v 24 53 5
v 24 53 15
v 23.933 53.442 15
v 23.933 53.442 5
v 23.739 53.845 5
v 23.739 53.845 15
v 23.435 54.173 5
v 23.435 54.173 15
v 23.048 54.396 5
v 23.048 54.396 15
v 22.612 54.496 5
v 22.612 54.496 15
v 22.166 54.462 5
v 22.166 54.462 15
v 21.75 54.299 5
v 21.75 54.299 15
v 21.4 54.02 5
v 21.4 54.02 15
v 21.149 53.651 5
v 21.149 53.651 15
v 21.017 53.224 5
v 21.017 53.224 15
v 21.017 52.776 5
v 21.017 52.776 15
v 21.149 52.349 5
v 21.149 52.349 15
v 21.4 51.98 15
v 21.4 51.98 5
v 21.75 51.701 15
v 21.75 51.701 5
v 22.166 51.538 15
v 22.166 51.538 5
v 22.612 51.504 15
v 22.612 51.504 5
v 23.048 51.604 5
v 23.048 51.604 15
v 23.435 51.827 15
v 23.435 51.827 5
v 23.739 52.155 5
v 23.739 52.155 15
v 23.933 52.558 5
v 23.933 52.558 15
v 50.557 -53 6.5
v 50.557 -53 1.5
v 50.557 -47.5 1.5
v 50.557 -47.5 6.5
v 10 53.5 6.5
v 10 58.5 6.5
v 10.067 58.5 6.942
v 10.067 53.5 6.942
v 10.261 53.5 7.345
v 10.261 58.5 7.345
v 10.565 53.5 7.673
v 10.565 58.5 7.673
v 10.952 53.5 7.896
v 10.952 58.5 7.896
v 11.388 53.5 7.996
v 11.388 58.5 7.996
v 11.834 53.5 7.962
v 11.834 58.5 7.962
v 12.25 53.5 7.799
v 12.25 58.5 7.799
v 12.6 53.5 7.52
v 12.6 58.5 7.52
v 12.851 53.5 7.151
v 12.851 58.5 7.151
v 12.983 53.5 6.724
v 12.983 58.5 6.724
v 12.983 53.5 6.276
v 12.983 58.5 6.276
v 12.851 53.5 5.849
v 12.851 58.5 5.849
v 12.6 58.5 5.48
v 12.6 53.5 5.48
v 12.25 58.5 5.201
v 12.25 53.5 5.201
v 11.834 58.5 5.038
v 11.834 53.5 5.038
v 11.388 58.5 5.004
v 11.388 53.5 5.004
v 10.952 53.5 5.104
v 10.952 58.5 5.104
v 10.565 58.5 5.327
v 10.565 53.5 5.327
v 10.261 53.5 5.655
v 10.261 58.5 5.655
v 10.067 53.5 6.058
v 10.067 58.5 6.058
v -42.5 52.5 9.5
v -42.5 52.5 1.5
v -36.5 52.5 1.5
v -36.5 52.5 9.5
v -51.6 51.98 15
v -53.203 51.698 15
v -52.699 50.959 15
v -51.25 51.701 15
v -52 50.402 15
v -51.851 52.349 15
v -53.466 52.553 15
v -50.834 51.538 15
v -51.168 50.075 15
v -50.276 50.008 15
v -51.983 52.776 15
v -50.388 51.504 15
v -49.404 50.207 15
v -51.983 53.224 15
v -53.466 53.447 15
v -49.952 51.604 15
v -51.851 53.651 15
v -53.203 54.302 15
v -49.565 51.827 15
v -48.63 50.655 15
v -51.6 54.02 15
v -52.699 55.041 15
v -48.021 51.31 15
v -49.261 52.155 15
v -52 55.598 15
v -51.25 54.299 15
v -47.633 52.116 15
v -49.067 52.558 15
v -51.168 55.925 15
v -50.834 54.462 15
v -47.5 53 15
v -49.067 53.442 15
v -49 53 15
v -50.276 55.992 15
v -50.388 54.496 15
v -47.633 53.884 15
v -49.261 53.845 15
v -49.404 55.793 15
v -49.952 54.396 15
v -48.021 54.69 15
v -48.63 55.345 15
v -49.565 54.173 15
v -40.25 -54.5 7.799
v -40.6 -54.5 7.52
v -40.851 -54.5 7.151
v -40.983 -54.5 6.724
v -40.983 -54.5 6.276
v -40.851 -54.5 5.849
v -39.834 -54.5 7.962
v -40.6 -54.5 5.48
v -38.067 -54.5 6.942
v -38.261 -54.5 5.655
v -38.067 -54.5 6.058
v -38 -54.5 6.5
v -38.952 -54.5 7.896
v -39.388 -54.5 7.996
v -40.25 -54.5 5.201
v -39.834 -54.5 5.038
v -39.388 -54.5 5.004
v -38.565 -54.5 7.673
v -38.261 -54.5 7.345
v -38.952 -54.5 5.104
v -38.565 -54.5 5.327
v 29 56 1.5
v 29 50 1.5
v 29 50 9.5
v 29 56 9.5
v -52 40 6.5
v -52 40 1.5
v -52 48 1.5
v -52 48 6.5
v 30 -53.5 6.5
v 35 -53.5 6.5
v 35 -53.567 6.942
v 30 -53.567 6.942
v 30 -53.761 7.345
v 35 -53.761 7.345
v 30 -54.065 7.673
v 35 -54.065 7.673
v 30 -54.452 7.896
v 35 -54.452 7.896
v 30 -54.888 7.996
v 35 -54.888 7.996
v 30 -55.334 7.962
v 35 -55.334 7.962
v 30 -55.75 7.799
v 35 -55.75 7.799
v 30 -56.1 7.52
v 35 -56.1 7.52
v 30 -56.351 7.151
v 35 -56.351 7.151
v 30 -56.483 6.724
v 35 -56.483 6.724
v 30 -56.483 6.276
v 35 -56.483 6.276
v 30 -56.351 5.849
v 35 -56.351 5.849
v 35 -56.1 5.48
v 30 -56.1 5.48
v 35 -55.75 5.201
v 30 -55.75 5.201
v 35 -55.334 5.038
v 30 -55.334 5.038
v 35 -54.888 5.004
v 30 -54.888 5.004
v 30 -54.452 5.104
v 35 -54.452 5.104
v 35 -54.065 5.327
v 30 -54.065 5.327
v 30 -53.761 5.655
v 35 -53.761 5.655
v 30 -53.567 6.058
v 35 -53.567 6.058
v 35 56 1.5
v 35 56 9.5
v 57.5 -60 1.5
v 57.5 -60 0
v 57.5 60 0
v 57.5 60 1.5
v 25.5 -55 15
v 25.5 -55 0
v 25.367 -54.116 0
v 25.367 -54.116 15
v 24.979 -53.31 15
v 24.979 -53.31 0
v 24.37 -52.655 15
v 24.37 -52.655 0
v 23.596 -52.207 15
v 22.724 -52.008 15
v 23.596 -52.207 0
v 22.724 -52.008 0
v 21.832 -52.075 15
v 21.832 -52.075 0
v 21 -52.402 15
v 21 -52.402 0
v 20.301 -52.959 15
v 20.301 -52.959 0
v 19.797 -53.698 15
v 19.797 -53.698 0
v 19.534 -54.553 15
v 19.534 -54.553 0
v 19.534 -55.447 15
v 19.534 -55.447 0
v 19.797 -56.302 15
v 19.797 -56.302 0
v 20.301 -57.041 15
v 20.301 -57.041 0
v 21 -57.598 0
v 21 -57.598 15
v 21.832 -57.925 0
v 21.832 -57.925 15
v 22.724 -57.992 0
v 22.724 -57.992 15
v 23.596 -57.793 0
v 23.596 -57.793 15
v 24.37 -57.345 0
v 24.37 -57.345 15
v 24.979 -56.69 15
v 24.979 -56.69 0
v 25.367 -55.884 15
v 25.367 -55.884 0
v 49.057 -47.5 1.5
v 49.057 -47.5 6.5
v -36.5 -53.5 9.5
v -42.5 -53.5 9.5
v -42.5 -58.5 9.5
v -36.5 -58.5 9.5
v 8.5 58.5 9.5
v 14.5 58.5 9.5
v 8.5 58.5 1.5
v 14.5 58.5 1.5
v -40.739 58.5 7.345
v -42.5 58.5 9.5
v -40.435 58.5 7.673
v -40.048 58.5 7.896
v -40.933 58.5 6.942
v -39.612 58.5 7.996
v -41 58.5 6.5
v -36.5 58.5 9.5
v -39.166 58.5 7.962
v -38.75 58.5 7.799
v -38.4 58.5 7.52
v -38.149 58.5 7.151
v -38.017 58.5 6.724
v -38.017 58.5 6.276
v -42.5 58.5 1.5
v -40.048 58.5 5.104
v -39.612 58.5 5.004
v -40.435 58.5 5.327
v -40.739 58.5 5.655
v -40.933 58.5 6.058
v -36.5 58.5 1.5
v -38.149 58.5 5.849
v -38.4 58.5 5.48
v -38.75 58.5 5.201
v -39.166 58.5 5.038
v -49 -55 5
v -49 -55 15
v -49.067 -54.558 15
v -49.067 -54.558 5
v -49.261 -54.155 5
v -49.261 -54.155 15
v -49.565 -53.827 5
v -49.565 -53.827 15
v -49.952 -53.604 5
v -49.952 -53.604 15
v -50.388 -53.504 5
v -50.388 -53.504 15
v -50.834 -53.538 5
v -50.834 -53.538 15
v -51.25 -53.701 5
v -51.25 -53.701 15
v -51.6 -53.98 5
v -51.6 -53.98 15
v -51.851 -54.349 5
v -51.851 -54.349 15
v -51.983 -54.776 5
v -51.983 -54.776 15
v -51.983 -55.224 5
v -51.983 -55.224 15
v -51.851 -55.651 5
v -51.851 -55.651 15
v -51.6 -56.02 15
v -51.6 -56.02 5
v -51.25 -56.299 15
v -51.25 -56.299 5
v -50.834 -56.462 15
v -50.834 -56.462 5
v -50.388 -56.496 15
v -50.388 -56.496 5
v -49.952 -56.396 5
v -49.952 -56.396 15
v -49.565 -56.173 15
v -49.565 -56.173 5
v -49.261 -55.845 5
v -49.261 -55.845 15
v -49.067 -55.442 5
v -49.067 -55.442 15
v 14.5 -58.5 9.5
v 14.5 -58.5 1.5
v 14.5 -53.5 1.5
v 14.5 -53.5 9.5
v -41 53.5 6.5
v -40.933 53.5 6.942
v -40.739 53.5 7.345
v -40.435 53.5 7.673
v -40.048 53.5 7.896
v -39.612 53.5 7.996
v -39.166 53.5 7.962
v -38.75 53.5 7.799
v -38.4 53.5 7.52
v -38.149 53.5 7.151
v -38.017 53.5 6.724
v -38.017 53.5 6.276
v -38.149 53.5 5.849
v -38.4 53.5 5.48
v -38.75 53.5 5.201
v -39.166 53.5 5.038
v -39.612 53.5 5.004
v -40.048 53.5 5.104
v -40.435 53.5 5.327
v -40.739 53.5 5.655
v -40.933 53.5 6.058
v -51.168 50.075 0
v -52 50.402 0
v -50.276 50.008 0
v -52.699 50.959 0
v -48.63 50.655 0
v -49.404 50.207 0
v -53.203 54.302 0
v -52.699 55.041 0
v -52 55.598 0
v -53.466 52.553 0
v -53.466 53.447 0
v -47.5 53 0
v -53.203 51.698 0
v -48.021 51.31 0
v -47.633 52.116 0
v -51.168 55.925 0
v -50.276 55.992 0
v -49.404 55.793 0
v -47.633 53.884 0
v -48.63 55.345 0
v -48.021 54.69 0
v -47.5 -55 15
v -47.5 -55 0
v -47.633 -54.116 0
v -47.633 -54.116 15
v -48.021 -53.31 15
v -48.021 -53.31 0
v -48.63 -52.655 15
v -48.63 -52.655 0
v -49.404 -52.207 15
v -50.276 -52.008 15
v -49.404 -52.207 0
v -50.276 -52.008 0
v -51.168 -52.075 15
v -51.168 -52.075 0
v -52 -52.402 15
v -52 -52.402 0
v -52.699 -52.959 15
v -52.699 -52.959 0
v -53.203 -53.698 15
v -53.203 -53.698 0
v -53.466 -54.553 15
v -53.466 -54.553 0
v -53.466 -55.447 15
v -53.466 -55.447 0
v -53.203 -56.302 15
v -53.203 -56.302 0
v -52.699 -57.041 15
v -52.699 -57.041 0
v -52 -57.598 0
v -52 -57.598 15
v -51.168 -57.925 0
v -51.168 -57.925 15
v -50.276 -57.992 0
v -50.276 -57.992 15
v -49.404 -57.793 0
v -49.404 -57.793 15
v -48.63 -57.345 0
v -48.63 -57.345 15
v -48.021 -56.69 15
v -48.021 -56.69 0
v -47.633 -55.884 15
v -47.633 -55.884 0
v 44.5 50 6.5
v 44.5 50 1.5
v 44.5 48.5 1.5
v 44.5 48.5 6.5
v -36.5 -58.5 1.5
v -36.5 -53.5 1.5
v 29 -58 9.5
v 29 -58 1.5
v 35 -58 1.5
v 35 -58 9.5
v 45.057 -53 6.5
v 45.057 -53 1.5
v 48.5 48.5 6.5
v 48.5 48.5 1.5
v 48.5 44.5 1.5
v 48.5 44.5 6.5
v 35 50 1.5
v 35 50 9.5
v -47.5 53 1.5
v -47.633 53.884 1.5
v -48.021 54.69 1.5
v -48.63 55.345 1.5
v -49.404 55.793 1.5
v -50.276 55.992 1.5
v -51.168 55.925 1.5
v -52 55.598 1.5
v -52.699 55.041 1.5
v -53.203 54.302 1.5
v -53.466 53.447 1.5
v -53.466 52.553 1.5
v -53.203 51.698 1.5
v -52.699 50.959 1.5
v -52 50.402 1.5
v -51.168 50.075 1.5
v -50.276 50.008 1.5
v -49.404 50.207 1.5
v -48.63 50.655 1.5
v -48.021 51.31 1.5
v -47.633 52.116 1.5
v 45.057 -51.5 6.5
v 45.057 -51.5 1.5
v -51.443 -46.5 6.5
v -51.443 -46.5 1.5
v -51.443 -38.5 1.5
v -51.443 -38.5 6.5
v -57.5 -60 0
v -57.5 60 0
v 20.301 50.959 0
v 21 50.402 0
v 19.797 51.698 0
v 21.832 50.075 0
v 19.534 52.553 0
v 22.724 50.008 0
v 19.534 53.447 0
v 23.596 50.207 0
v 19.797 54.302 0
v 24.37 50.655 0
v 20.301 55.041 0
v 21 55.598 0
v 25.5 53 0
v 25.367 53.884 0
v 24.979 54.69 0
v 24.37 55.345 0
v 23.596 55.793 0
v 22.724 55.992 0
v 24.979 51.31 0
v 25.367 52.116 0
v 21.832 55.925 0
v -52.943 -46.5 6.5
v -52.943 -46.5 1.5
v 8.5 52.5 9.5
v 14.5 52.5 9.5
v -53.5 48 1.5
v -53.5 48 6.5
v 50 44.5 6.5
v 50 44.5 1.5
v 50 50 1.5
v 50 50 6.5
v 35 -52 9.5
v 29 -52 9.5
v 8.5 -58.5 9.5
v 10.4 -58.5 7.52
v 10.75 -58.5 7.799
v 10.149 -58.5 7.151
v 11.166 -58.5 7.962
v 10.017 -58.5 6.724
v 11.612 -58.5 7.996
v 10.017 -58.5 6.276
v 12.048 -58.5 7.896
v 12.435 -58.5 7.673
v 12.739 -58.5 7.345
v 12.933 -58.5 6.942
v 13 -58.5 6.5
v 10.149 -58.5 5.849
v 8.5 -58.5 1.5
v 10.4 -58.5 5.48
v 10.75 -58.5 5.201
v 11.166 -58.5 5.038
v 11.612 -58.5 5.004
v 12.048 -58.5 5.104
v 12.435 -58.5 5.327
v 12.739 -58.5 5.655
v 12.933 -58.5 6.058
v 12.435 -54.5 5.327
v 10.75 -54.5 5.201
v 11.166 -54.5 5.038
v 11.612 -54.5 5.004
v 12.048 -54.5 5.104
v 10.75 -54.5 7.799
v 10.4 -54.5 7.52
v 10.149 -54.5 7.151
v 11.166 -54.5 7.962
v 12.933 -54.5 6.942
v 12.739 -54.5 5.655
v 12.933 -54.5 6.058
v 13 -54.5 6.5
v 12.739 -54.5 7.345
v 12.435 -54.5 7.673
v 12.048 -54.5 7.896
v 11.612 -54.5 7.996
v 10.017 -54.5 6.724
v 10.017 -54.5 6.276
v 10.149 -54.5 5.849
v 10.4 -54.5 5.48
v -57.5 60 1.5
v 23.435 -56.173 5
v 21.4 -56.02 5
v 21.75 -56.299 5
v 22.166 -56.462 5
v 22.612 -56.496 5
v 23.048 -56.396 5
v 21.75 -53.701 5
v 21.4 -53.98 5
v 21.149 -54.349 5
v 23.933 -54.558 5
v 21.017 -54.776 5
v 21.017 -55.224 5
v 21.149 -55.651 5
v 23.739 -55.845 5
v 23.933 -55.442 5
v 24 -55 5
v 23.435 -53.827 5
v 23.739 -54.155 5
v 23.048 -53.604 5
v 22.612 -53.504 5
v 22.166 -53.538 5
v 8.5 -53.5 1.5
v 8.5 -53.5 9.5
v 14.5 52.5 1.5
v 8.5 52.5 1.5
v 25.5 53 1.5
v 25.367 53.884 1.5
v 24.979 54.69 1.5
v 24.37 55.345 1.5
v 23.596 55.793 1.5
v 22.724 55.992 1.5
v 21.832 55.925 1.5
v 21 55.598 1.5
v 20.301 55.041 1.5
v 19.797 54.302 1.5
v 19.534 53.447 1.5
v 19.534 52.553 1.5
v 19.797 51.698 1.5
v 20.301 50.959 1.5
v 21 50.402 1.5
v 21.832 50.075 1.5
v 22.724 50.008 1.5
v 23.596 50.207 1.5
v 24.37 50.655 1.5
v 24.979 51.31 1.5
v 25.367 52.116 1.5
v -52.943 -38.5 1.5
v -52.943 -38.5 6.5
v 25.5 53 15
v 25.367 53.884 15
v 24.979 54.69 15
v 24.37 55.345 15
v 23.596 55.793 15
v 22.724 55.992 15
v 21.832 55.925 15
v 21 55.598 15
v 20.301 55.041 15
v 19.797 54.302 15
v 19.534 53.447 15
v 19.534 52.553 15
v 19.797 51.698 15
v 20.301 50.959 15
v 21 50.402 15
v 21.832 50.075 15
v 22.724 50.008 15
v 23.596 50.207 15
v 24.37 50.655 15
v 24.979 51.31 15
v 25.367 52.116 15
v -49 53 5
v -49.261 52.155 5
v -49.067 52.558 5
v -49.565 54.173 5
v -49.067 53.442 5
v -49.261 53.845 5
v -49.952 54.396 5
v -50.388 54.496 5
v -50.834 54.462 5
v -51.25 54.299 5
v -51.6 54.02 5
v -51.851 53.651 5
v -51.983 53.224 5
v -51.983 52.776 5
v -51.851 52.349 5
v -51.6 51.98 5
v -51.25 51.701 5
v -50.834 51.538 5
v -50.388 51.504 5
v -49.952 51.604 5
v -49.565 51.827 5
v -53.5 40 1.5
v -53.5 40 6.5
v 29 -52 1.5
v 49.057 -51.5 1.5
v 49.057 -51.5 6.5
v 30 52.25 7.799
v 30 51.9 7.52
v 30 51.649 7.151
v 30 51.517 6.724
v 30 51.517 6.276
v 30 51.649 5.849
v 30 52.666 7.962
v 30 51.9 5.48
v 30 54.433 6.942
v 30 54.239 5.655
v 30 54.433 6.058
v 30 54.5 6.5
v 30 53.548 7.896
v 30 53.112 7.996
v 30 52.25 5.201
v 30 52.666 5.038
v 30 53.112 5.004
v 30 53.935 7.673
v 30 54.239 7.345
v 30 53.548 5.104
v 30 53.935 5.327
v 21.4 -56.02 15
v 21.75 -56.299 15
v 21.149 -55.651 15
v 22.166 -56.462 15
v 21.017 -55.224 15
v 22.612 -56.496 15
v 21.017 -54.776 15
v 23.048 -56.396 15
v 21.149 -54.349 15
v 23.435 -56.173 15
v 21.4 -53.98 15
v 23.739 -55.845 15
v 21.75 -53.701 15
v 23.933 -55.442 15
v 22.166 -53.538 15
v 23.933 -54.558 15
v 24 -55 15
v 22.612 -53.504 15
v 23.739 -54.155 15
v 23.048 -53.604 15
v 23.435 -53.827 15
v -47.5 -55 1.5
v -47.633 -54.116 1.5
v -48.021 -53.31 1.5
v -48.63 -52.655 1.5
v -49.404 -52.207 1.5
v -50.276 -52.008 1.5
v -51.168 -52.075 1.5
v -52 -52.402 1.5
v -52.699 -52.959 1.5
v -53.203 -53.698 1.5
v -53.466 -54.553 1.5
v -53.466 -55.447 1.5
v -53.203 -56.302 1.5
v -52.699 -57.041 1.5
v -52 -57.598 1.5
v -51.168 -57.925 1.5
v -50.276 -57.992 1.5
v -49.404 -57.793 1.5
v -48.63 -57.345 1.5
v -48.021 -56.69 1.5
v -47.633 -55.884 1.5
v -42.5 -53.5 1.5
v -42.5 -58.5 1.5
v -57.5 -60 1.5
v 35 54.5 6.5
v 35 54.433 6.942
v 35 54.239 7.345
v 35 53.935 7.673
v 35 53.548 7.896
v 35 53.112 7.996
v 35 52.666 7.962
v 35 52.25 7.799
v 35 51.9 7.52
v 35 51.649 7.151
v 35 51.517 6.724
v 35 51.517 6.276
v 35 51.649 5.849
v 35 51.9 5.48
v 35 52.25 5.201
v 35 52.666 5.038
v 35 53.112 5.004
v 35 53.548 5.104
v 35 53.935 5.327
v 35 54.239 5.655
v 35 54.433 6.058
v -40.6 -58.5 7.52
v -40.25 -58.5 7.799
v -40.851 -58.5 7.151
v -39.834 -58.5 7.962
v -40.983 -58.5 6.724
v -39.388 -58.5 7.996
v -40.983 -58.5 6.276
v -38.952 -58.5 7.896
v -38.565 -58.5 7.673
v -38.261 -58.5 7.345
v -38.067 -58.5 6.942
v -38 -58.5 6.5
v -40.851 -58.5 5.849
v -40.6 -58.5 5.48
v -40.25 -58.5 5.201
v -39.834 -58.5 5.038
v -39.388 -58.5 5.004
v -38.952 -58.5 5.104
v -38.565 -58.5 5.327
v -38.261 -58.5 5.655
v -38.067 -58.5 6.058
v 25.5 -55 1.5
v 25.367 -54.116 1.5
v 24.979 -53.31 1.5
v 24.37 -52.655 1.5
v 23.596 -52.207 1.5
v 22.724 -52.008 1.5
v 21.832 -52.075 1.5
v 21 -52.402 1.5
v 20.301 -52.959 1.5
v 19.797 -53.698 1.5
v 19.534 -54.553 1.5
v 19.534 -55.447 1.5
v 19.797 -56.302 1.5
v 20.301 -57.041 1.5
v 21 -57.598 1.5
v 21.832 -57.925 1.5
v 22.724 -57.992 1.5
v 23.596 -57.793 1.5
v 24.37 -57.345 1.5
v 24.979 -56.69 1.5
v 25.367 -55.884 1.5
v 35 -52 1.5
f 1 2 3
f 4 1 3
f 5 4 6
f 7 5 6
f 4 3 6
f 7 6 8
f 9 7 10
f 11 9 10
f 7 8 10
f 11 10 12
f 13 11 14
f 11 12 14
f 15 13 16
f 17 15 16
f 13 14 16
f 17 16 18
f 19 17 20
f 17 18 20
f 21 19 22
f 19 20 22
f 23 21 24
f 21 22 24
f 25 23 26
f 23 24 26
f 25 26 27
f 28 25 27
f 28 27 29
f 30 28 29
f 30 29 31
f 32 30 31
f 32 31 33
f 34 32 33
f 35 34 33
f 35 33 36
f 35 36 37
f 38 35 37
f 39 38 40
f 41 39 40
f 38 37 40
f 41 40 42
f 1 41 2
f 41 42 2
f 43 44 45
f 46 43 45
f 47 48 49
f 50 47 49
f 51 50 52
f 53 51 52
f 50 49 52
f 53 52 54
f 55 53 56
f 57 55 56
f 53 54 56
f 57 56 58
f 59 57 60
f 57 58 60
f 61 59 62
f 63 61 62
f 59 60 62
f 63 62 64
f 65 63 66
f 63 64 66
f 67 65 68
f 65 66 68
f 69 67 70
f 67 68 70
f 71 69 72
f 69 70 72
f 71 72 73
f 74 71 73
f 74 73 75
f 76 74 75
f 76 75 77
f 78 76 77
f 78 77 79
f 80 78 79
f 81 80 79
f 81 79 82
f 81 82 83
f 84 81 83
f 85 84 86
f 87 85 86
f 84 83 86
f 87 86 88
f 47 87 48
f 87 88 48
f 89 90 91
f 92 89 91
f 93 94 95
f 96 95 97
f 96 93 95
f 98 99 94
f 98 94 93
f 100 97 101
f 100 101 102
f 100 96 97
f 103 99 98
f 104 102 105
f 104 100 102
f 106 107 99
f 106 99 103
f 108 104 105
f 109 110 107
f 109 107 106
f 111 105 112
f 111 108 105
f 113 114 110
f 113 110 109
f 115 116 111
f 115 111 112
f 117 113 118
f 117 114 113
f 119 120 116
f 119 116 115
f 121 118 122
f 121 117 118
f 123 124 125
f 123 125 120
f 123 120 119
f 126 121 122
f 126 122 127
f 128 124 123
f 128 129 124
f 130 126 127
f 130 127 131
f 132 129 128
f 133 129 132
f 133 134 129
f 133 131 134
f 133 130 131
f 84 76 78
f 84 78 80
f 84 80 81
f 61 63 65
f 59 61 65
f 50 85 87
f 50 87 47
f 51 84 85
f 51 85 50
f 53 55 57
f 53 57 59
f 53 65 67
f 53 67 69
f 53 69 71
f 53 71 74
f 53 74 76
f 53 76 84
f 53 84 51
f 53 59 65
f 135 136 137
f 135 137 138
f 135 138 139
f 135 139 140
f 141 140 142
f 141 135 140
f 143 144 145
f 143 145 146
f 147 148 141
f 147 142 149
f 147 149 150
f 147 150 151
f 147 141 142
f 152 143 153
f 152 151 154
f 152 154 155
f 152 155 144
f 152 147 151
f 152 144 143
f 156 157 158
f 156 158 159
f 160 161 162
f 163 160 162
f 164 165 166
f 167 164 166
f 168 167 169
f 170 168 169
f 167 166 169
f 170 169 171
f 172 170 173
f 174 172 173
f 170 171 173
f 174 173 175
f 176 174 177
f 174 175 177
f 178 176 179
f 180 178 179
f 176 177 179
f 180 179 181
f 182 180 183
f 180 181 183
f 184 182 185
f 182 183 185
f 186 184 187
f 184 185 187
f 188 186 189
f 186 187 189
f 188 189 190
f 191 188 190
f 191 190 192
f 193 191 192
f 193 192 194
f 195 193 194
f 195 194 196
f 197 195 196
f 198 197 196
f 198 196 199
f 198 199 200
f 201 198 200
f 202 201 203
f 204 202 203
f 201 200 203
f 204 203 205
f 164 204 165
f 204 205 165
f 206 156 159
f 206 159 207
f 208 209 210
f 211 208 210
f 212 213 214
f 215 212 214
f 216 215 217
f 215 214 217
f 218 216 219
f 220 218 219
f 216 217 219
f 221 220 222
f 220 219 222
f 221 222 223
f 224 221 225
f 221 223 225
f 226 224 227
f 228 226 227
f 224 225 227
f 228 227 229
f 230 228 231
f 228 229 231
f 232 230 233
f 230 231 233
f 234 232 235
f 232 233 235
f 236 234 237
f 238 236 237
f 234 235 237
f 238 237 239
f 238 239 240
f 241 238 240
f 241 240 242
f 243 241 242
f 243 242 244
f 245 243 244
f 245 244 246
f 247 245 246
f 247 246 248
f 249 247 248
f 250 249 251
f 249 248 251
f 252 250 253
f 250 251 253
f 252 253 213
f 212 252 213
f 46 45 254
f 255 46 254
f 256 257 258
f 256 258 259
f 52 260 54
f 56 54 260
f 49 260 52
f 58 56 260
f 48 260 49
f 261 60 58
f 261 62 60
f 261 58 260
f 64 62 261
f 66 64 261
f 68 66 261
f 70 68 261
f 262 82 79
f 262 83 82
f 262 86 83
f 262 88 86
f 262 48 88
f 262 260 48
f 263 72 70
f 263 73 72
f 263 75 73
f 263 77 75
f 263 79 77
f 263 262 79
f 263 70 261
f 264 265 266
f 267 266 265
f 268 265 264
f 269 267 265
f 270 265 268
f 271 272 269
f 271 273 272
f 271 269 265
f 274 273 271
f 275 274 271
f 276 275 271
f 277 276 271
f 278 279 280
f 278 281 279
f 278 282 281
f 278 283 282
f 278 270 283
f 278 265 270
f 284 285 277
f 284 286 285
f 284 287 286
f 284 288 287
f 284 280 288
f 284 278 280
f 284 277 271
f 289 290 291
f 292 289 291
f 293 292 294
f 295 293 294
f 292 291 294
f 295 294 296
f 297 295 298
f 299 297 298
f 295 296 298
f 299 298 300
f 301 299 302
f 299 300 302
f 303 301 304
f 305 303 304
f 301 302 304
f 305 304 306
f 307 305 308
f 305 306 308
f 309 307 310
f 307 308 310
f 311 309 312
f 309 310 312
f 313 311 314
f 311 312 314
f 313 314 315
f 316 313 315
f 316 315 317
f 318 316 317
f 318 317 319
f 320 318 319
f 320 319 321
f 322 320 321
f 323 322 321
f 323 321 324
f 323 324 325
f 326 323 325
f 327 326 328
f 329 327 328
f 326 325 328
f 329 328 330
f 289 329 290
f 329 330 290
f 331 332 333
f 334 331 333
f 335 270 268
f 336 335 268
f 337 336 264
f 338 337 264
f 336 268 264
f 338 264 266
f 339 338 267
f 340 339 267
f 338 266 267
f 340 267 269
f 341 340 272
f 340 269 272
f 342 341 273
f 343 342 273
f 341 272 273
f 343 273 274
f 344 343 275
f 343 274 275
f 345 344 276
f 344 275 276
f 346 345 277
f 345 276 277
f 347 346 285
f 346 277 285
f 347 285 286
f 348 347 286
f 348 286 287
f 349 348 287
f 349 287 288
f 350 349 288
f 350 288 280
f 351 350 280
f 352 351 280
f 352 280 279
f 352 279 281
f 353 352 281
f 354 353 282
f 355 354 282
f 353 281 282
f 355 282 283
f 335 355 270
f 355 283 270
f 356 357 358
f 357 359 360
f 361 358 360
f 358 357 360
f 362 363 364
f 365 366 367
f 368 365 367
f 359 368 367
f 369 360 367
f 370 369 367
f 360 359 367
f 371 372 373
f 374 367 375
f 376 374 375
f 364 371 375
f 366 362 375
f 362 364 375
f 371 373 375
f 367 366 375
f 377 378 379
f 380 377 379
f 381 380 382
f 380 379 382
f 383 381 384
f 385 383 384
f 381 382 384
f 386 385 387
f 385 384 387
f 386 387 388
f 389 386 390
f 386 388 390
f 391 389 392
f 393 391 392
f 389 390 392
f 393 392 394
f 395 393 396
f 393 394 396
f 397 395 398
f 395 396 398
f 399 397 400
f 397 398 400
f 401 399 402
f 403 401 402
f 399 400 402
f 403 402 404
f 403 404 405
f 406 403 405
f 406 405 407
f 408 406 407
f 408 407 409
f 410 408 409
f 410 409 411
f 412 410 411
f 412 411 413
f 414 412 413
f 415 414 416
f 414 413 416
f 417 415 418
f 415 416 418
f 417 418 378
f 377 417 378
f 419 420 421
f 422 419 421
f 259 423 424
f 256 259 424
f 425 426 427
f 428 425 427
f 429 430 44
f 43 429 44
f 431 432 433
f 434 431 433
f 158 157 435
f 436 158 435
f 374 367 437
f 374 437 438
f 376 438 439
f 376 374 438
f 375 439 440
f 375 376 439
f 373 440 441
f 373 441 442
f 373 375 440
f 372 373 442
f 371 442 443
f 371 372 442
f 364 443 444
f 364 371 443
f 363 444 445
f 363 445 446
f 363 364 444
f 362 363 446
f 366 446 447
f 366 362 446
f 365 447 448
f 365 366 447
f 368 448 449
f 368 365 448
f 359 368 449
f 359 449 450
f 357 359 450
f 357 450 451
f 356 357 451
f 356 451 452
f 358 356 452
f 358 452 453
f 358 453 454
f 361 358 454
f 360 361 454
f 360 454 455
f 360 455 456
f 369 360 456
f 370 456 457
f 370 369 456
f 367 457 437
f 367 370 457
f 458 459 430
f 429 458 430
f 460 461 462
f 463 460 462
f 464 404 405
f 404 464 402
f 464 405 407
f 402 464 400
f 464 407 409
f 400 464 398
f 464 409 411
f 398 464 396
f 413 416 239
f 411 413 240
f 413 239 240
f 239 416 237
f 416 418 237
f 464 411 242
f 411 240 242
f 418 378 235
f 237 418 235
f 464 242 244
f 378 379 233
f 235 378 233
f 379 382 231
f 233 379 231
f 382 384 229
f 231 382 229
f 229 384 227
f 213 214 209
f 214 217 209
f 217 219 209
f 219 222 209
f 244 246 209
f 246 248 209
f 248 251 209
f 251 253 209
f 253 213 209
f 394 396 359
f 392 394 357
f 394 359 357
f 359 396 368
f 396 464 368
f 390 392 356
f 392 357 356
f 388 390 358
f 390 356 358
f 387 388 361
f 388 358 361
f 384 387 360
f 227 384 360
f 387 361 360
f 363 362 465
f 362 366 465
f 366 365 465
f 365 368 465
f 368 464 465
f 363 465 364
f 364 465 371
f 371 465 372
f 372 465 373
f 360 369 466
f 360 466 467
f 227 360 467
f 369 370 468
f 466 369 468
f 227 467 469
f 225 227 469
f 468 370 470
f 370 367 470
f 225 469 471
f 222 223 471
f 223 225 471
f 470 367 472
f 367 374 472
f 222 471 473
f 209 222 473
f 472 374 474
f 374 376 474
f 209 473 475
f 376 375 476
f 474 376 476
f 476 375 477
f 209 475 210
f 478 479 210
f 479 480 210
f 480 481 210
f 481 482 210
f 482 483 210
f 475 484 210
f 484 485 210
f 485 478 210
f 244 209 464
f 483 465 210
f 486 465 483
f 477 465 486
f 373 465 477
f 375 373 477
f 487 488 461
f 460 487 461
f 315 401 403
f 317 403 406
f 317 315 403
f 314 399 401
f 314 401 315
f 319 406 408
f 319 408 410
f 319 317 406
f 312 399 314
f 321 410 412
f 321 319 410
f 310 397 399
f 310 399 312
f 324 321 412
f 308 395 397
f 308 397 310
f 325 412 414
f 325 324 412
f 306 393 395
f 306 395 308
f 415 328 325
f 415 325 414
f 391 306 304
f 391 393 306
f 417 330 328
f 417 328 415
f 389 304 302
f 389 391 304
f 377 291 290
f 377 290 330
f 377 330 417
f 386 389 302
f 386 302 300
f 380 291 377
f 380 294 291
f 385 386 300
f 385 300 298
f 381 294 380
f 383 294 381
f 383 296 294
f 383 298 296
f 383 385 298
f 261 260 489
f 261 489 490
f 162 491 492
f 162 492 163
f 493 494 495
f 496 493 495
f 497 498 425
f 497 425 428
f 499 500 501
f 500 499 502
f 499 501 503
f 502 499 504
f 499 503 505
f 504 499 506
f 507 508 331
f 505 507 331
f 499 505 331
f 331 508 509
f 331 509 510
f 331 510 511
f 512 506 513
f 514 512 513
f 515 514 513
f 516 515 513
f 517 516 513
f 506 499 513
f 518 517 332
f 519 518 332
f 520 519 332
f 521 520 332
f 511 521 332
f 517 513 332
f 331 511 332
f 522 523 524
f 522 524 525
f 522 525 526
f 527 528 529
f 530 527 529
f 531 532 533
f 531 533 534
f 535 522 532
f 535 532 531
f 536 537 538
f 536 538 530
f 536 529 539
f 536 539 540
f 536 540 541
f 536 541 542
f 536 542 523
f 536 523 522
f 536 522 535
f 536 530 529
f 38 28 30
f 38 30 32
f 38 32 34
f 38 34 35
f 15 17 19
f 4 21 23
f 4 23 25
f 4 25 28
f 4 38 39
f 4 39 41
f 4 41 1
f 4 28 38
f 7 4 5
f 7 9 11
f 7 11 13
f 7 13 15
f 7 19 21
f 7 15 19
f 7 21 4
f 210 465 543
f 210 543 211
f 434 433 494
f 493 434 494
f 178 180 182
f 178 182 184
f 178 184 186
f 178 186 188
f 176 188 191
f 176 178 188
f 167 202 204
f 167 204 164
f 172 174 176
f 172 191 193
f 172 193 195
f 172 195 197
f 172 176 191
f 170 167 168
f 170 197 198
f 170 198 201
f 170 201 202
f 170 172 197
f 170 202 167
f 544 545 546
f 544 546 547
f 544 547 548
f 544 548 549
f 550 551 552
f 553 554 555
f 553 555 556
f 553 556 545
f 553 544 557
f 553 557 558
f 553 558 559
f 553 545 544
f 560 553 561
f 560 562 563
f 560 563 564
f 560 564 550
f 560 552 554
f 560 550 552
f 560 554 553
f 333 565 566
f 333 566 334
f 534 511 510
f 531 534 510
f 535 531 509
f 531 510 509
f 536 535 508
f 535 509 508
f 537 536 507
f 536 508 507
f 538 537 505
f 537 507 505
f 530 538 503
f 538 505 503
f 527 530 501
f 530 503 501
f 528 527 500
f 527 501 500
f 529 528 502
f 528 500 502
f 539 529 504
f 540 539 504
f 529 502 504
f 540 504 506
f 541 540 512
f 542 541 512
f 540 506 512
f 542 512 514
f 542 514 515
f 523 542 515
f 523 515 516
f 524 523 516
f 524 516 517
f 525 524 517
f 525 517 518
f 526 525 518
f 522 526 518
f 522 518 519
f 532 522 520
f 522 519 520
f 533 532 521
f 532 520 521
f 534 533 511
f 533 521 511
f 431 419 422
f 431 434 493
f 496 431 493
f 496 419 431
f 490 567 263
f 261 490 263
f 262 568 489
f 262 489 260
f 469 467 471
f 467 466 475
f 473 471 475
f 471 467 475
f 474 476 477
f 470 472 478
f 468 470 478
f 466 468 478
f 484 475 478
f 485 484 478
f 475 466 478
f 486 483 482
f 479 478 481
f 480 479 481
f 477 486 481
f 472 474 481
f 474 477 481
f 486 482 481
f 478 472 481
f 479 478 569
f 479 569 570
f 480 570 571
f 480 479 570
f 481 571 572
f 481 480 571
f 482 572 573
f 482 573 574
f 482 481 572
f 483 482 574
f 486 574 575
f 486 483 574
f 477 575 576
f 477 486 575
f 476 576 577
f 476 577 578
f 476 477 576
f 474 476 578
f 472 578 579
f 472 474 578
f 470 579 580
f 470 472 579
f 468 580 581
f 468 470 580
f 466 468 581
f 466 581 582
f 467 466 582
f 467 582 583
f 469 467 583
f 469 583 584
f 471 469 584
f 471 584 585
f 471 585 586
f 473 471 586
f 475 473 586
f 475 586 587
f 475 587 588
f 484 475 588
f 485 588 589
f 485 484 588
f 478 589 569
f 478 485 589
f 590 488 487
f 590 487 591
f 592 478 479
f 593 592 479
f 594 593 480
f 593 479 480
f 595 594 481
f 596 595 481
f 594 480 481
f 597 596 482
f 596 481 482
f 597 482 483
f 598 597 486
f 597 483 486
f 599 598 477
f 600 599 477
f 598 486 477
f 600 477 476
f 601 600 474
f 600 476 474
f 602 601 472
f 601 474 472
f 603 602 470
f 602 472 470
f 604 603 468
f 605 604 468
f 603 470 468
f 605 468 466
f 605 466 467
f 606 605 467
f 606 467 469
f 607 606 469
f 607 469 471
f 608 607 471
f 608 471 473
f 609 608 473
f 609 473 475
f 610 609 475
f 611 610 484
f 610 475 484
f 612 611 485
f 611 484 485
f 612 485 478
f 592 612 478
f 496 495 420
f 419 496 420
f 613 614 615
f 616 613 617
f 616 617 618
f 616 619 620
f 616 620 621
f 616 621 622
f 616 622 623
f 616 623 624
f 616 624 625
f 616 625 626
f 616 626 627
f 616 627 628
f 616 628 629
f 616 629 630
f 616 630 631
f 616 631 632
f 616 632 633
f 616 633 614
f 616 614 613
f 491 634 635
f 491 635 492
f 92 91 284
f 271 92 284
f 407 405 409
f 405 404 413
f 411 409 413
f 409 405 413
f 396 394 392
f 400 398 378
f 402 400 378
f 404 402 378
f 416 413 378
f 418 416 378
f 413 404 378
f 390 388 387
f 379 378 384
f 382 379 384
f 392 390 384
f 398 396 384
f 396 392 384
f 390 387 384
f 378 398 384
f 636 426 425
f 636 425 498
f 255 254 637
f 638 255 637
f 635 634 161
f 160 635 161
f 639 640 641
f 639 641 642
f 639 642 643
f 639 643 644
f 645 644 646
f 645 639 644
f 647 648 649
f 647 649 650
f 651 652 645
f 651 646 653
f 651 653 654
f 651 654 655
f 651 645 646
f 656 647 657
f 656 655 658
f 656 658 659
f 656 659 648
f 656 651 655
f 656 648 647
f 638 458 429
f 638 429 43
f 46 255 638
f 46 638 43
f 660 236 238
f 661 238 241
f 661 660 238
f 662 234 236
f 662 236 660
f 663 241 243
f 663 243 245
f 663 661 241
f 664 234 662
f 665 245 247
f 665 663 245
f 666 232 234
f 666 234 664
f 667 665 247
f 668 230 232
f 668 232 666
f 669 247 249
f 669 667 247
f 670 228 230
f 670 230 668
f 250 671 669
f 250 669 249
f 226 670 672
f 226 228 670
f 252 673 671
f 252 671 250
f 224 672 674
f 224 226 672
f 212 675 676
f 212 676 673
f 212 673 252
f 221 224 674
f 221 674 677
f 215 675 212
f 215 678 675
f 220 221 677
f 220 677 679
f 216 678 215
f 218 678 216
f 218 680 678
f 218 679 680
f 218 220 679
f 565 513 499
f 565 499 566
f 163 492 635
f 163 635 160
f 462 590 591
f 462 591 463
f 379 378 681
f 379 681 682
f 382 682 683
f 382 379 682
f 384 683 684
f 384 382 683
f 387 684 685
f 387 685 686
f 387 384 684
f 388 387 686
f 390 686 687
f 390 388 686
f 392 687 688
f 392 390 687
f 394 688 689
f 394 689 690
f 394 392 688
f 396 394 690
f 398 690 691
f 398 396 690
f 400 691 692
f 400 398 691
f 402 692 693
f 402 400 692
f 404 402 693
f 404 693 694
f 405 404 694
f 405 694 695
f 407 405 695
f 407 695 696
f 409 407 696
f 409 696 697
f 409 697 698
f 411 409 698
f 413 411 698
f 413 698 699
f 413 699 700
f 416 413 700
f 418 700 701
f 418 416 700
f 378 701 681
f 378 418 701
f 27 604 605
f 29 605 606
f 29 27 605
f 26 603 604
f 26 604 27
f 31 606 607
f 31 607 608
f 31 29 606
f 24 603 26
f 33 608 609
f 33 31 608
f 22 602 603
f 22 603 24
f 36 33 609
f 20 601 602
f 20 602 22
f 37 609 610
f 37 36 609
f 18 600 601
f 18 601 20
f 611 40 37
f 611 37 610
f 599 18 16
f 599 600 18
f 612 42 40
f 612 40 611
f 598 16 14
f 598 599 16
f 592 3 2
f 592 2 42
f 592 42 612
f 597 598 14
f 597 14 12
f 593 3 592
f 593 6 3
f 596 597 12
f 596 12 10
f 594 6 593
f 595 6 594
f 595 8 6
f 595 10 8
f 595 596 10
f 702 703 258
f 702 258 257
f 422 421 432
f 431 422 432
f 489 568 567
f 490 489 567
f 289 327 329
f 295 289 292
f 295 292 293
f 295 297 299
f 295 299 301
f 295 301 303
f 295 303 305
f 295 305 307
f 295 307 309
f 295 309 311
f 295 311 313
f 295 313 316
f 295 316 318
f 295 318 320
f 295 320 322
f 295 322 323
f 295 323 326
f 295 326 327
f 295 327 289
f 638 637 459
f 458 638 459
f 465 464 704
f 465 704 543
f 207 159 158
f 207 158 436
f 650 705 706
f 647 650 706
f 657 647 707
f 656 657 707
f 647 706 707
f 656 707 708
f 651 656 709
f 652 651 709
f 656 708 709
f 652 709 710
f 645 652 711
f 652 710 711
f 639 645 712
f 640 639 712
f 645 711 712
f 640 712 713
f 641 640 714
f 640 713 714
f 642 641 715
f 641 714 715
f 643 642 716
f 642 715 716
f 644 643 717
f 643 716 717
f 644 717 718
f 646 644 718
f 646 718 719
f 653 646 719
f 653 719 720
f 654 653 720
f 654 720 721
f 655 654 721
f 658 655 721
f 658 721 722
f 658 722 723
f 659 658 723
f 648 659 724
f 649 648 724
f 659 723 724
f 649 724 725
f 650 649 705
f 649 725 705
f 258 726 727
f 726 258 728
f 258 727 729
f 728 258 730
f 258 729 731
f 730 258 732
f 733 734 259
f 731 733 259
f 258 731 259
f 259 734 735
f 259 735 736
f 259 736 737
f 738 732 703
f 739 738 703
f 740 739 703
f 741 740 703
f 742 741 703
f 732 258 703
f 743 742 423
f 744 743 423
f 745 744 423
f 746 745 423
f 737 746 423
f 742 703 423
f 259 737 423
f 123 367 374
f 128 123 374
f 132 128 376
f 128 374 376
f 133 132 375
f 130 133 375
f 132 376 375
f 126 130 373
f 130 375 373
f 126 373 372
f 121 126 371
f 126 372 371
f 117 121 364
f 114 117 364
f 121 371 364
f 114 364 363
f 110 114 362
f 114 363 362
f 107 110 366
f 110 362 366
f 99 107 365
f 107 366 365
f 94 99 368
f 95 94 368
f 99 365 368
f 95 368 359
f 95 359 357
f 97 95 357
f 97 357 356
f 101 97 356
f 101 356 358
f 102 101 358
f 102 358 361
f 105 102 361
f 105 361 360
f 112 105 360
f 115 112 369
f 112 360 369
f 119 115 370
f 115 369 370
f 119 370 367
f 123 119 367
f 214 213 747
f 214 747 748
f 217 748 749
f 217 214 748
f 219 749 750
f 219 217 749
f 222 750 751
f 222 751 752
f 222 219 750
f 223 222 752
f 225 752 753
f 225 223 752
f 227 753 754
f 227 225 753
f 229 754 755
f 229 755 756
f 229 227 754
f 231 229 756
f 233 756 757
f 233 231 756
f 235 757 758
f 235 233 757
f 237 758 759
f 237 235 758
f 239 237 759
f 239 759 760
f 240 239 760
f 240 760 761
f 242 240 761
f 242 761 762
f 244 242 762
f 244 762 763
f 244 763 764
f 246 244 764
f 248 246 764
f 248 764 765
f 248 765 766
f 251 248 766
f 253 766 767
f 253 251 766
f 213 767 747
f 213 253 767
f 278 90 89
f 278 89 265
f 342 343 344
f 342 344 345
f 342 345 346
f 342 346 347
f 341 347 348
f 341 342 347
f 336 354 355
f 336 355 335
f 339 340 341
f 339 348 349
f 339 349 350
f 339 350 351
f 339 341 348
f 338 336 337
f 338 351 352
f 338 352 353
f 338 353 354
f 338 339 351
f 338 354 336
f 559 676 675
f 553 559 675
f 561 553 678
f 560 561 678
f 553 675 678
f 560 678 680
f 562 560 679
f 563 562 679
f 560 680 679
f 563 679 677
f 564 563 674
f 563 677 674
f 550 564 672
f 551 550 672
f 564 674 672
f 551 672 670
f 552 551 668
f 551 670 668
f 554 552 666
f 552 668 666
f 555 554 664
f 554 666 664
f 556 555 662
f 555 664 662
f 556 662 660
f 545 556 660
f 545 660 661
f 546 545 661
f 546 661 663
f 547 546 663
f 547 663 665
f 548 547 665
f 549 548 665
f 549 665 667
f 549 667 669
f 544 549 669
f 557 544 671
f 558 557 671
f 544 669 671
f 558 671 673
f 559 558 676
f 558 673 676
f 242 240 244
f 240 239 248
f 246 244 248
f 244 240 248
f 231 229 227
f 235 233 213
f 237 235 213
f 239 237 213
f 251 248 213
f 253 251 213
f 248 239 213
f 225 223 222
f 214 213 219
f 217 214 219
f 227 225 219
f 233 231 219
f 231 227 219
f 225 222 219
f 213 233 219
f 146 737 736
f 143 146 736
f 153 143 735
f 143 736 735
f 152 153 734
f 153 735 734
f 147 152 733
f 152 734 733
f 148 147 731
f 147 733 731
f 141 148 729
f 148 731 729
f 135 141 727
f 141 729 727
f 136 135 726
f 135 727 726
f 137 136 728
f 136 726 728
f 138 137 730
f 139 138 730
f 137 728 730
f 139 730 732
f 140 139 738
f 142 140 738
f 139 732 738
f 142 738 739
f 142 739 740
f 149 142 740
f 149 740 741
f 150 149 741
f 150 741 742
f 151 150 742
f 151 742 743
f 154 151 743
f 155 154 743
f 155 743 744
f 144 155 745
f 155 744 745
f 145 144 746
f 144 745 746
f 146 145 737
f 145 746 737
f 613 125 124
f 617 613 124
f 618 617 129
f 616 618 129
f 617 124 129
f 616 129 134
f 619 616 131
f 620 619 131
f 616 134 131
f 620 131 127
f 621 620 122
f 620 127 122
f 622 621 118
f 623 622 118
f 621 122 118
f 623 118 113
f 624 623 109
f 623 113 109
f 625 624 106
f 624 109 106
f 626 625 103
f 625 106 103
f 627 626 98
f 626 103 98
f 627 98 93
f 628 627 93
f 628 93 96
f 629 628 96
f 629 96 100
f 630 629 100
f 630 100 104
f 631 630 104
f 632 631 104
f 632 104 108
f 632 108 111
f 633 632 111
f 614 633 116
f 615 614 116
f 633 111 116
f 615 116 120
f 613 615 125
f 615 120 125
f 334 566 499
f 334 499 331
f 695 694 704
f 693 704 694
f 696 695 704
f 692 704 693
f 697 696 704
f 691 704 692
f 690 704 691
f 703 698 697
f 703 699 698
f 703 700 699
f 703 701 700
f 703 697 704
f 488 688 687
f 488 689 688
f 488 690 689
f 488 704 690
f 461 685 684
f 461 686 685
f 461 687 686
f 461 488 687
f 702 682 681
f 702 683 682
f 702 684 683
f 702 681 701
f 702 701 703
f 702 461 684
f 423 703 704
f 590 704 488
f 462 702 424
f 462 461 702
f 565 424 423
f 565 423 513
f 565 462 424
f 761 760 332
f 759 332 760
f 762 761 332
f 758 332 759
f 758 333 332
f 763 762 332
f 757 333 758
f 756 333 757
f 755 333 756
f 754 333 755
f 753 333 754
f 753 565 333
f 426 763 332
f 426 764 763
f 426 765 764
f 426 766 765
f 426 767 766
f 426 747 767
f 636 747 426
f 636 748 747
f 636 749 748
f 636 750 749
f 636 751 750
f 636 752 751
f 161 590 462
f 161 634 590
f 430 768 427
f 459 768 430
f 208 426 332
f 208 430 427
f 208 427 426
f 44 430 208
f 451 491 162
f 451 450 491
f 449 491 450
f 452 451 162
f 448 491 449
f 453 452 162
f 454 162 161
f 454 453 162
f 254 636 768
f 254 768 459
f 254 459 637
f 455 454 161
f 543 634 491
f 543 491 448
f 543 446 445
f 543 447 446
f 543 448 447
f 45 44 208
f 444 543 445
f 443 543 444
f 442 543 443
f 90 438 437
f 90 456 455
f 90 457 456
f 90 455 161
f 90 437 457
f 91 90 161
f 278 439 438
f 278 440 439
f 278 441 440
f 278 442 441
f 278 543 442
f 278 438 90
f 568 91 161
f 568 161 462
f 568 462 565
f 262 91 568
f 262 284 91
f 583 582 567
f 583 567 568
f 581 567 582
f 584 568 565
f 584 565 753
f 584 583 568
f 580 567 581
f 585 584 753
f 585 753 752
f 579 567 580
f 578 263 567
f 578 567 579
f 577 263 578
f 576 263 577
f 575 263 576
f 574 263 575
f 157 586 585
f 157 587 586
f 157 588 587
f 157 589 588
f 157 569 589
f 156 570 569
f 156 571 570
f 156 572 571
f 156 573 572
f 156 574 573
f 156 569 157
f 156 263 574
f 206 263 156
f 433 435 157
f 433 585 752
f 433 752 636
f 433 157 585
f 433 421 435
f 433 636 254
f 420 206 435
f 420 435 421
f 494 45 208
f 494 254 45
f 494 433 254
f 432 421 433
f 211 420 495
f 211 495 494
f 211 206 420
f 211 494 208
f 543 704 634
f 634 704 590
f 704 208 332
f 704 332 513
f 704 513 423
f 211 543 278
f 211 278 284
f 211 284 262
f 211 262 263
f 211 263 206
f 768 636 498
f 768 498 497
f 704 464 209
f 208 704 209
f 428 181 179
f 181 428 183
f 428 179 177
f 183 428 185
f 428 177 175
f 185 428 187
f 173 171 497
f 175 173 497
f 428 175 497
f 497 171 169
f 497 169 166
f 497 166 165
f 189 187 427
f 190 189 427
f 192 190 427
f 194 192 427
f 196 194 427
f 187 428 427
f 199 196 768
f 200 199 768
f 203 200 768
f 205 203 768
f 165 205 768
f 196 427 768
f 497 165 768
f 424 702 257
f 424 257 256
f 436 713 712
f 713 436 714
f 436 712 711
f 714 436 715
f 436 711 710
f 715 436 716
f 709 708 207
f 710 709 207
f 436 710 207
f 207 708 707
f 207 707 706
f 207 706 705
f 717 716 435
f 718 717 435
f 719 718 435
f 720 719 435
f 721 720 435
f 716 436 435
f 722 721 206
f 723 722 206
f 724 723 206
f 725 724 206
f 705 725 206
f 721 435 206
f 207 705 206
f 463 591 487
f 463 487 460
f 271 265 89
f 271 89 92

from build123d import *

# Parameters (mm, degrees)
F0_W      = 115
F0_H      = 120
F0_R      = 3
F0_W_2    = 6
F0_H_2    = 5
F0_W_3    = 1.5
F0_H_3    = 8
F0_H_4    = 6
F1_DEPTH  = 1.5
F2_DEPTH  = 15
F3_R      = 1.5
F4_DEPTH  = 10
F5_R      = 1.5
F6_DEPTH  = 10
F7_R      = 1.5
F8_DEPTH  = 10
F9_R      = 1.5
F10_DEPTH = 10
F11_DEPTH = 9.5
F12_R     = 1.5
F13_DEPTH = 4
F14_R     = 1.5
F15_DEPTH = 4
F16_R     = 1.5
F17_DEPTH = 5
F18_R     = 1.5
F19_DEPTH = 5
F20_R     = 1.5
F21_DEPTH = 5
F22_R     = 1.5
F23_DEPTH = 5
F24_DEPTH = 6.5
F25_DEPTH = 6.5
F26_DEPTH = 6.5
F27_DEPTH = 6.5


with BuildPart() as f1:
    # F0 (on Top) → F1 (new body)
    with BuildSketch(Plane.XY):
        Rectangle(F0_W, F0_H)
        with Locations((-50.5, -55)):
            Circle(F0_R, mode=Mode.SUBTRACT)
        with Locations((-39.5, -56)):
            Rectangle(F0_W_2, F0_H_2, mode=Mode.SUBTRACT)
        with Locations((-52.19269, -42.5)):
            Rectangle(F0_W_3, F0_H_3, mode=Mode.SUBTRACT)
        with Locations((11.5, -56)):
            Rectangle(F0_W_2, F0_H_2, mode=Mode.SUBTRACT)
        with Locations((22.5, -55)):
            Circle(F0_R, mode=Mode.SUBTRACT)
        with Locations((32, -55)):
            Rectangle(F0_W_2, F0_H_4, mode=Mode.SUBTRACT)
        Polygon((50.55731, -53), (45.05731, -53), (45.05731, -51.5), (49.05731, -51.5), (49.05731, -47.5), (50.55731, -47.5), align=None, mode=Mode.SUBTRACT)
        with Locations((-52.75, 44)):
            Rectangle(F0_W_3, F0_H_3, mode=Mode.SUBTRACT)
        with Locations((-50.5, 53)):
            Circle(F0_R, mode=Mode.SUBTRACT)
        with Locations((-39.5, 55.5)):
            Rectangle(F0_W_2, F0_H_4, mode=Mode.SUBTRACT)
        with Locations((11.5, 55.5)):
            Rectangle(F0_W_2, F0_H_4, mode=Mode.SUBTRACT)
        with Locations((22.5, 53)):
            Circle(F0_R, mode=Mode.SUBTRACT)
        with Locations((32, 53)):
            Rectangle(F0_W_2, F0_H_4, mode=Mode.SUBTRACT)
        Polygon((44.5, 48.5), (44.5, 50), (50, 50), (50, 44.5), (48.5, 44.5), (48.5, 48.5), align=None, mode=Mode.SUBTRACT)
    extrude(amount=F1_DEPTH)

    # F0 (on Top) → F11 (join)
    with BuildSketch(Plane.XY):
        with Locations((-39.5, 55.5)):
            Rectangle(F0_W_2, F0_H_4)
        with Locations((11.5, 55.5)):
            Rectangle(F0_W_2, F0_H_4)
        with Locations((32, 53)):
            Rectangle(F0_W_2, F0_H_4)
        with Locations((32, -55)):
            Rectangle(F0_W_2, F0_H_4)
        with Locations((11.5, -56)):
            Rectangle(F0_W_2, F0_H_2)
        with Locations((-39.5, -56)):
            Rectangle(F0_W_2, F0_H_2)
    extrude(amount=F11_DEPTH)

    # F12 (on face) → F13 (cut)
    with BuildSketch(Plane.XZ.offset(58.5)):
        with Locations((-39.5, 6.5)):
            Circle(F12_R)
    extrude(amount=-F13_DEPTH, mode=Mode.SUBTRACT)

    # F14 (on face) → F15 (cut)
    with BuildSketch(Plane.XZ.offset(58.5)):
        with Locations((11.5, 6.5)):
            Circle(F14_R)
    extrude(amount=-F15_DEPTH, mode=Mode.SUBTRACT)

    # F16 (on face) → F17 (cut)
    with BuildSketch(Plane.YZ.offset(35)):
        with Locations((-55, 6.5)):
            Circle(F16_R)
    extrude(amount=-F17_DEPTH, mode=Mode.SUBTRACT)

    # F18 (on face) → F19 (cut)
    with BuildSketch(Plane.YZ.offset(35)):
        with Locations((53, 6.5)):
            Circle(F18_R)
    extrude(amount=-F19_DEPTH, mode=Mode.SUBTRACT)

    # F20 (on face) → F21 (cut)
    with BuildSketch(Plane(origin=(0, 58.5, 0), x_dir=(-1, 0, 0), z_dir=(0, 1, 0))):
        with Locations((-11.5, 6.5)):
            Circle(F20_R)
    extrude(amount=-F21_DEPTH, mode=Mode.SUBTRACT)

    # F22 (on face) → F23 (cut)
    with BuildSketch(Plane(origin=(0, 58.5, 0), x_dir=(-1, 0, 0), z_dir=(0, 1, 0))):
        with Locations((39.5, 6.5)):
            Circle(F22_R)
    extrude(amount=-F23_DEPTH, mode=Mode.SUBTRACT)

    # F0 (on Top) → F24 (join)
    with BuildSketch(Plane.XY):
        Polygon((50, 50), (44.5, 50), (44.5, 48.5), (48.5, 48.5), (48.5, 44.5), (50, 44.5), align=None)
    extrude(amount=F24_DEPTH)

    # F0 (on Top) → F25 (join)
    with BuildSketch(Plane.XY):
        Polygon((45.05731, -51.5), (45.05731, -53), (50.55731, -53), (50.55731, -47.5), (49.05731, -47.5), (49.05731, -51.5), align=None)
    extrude(amount=F25_DEPTH)

    # F0 (on Top) → F26 (join)
    with BuildSketch(Plane.XY):
        with Locations((-52.75, 44)):
            Rectangle(F0_W_3, F0_H_3)
    extrude(amount=F26_DEPTH)

    # F0 (on Top) → F27 (join)
    with BuildSketch(Plane.XY):
        with Locations((-52.19269, -42.5)):
            Rectangle(F0_W_3, F0_H_3)
    extrude(amount=F27_DEPTH)


with BuildPart() as f2:
    # F0 (on Top) → F2 (new body)
    with BuildSketch(Plane.XY):
        with Locations((-50.5, 53)):
            Circle(F0_R)
        with Locations((22.5, 53)):
            Circle(F0_R)
        with Locations((-50.5, -55)):
            Circle(F0_R)
        with Locations((22.5, -55)):
            Circle(F0_R)
    extrude(amount=F2_DEPTH)

    # F3 (on face) → F4 (cut)
    with BuildSketch(Plane.XY.offset(15)):
        with Locations((22.5, -55)):
            Circle(F3_R)
    extrude(amount=-F4_DEPTH, mode=Mode.SUBTRACT)

    # F5 (on face) → F6 (cut)
    with BuildSketch(Plane.XY.offset(15)):
        with Locations((-50.5, -55)):
            Circle(F5_R)
    extrude(amount=-F6_DEPTH, mode=Mode.SUBTRACT)

    # F7 (on face) → F8 (cut)
    with BuildSketch(Plane.XY.offset(15)):
        with Locations((-50.5, 53)):
            Circle(F7_R)
    extrude(amount=-F8_DEPTH, mode=Mode.SUBTRACT)

    # F9 (on face) → F10 (cut)
    with BuildSketch(Plane.XY.offset(15)):
        with Locations((22.5, 53)):
            Circle(F9_R)
    extrude(amount=-F10_DEPTH, mode=Mode.SUBTRACT)


solid = Compound([f1.part, f2.part])
